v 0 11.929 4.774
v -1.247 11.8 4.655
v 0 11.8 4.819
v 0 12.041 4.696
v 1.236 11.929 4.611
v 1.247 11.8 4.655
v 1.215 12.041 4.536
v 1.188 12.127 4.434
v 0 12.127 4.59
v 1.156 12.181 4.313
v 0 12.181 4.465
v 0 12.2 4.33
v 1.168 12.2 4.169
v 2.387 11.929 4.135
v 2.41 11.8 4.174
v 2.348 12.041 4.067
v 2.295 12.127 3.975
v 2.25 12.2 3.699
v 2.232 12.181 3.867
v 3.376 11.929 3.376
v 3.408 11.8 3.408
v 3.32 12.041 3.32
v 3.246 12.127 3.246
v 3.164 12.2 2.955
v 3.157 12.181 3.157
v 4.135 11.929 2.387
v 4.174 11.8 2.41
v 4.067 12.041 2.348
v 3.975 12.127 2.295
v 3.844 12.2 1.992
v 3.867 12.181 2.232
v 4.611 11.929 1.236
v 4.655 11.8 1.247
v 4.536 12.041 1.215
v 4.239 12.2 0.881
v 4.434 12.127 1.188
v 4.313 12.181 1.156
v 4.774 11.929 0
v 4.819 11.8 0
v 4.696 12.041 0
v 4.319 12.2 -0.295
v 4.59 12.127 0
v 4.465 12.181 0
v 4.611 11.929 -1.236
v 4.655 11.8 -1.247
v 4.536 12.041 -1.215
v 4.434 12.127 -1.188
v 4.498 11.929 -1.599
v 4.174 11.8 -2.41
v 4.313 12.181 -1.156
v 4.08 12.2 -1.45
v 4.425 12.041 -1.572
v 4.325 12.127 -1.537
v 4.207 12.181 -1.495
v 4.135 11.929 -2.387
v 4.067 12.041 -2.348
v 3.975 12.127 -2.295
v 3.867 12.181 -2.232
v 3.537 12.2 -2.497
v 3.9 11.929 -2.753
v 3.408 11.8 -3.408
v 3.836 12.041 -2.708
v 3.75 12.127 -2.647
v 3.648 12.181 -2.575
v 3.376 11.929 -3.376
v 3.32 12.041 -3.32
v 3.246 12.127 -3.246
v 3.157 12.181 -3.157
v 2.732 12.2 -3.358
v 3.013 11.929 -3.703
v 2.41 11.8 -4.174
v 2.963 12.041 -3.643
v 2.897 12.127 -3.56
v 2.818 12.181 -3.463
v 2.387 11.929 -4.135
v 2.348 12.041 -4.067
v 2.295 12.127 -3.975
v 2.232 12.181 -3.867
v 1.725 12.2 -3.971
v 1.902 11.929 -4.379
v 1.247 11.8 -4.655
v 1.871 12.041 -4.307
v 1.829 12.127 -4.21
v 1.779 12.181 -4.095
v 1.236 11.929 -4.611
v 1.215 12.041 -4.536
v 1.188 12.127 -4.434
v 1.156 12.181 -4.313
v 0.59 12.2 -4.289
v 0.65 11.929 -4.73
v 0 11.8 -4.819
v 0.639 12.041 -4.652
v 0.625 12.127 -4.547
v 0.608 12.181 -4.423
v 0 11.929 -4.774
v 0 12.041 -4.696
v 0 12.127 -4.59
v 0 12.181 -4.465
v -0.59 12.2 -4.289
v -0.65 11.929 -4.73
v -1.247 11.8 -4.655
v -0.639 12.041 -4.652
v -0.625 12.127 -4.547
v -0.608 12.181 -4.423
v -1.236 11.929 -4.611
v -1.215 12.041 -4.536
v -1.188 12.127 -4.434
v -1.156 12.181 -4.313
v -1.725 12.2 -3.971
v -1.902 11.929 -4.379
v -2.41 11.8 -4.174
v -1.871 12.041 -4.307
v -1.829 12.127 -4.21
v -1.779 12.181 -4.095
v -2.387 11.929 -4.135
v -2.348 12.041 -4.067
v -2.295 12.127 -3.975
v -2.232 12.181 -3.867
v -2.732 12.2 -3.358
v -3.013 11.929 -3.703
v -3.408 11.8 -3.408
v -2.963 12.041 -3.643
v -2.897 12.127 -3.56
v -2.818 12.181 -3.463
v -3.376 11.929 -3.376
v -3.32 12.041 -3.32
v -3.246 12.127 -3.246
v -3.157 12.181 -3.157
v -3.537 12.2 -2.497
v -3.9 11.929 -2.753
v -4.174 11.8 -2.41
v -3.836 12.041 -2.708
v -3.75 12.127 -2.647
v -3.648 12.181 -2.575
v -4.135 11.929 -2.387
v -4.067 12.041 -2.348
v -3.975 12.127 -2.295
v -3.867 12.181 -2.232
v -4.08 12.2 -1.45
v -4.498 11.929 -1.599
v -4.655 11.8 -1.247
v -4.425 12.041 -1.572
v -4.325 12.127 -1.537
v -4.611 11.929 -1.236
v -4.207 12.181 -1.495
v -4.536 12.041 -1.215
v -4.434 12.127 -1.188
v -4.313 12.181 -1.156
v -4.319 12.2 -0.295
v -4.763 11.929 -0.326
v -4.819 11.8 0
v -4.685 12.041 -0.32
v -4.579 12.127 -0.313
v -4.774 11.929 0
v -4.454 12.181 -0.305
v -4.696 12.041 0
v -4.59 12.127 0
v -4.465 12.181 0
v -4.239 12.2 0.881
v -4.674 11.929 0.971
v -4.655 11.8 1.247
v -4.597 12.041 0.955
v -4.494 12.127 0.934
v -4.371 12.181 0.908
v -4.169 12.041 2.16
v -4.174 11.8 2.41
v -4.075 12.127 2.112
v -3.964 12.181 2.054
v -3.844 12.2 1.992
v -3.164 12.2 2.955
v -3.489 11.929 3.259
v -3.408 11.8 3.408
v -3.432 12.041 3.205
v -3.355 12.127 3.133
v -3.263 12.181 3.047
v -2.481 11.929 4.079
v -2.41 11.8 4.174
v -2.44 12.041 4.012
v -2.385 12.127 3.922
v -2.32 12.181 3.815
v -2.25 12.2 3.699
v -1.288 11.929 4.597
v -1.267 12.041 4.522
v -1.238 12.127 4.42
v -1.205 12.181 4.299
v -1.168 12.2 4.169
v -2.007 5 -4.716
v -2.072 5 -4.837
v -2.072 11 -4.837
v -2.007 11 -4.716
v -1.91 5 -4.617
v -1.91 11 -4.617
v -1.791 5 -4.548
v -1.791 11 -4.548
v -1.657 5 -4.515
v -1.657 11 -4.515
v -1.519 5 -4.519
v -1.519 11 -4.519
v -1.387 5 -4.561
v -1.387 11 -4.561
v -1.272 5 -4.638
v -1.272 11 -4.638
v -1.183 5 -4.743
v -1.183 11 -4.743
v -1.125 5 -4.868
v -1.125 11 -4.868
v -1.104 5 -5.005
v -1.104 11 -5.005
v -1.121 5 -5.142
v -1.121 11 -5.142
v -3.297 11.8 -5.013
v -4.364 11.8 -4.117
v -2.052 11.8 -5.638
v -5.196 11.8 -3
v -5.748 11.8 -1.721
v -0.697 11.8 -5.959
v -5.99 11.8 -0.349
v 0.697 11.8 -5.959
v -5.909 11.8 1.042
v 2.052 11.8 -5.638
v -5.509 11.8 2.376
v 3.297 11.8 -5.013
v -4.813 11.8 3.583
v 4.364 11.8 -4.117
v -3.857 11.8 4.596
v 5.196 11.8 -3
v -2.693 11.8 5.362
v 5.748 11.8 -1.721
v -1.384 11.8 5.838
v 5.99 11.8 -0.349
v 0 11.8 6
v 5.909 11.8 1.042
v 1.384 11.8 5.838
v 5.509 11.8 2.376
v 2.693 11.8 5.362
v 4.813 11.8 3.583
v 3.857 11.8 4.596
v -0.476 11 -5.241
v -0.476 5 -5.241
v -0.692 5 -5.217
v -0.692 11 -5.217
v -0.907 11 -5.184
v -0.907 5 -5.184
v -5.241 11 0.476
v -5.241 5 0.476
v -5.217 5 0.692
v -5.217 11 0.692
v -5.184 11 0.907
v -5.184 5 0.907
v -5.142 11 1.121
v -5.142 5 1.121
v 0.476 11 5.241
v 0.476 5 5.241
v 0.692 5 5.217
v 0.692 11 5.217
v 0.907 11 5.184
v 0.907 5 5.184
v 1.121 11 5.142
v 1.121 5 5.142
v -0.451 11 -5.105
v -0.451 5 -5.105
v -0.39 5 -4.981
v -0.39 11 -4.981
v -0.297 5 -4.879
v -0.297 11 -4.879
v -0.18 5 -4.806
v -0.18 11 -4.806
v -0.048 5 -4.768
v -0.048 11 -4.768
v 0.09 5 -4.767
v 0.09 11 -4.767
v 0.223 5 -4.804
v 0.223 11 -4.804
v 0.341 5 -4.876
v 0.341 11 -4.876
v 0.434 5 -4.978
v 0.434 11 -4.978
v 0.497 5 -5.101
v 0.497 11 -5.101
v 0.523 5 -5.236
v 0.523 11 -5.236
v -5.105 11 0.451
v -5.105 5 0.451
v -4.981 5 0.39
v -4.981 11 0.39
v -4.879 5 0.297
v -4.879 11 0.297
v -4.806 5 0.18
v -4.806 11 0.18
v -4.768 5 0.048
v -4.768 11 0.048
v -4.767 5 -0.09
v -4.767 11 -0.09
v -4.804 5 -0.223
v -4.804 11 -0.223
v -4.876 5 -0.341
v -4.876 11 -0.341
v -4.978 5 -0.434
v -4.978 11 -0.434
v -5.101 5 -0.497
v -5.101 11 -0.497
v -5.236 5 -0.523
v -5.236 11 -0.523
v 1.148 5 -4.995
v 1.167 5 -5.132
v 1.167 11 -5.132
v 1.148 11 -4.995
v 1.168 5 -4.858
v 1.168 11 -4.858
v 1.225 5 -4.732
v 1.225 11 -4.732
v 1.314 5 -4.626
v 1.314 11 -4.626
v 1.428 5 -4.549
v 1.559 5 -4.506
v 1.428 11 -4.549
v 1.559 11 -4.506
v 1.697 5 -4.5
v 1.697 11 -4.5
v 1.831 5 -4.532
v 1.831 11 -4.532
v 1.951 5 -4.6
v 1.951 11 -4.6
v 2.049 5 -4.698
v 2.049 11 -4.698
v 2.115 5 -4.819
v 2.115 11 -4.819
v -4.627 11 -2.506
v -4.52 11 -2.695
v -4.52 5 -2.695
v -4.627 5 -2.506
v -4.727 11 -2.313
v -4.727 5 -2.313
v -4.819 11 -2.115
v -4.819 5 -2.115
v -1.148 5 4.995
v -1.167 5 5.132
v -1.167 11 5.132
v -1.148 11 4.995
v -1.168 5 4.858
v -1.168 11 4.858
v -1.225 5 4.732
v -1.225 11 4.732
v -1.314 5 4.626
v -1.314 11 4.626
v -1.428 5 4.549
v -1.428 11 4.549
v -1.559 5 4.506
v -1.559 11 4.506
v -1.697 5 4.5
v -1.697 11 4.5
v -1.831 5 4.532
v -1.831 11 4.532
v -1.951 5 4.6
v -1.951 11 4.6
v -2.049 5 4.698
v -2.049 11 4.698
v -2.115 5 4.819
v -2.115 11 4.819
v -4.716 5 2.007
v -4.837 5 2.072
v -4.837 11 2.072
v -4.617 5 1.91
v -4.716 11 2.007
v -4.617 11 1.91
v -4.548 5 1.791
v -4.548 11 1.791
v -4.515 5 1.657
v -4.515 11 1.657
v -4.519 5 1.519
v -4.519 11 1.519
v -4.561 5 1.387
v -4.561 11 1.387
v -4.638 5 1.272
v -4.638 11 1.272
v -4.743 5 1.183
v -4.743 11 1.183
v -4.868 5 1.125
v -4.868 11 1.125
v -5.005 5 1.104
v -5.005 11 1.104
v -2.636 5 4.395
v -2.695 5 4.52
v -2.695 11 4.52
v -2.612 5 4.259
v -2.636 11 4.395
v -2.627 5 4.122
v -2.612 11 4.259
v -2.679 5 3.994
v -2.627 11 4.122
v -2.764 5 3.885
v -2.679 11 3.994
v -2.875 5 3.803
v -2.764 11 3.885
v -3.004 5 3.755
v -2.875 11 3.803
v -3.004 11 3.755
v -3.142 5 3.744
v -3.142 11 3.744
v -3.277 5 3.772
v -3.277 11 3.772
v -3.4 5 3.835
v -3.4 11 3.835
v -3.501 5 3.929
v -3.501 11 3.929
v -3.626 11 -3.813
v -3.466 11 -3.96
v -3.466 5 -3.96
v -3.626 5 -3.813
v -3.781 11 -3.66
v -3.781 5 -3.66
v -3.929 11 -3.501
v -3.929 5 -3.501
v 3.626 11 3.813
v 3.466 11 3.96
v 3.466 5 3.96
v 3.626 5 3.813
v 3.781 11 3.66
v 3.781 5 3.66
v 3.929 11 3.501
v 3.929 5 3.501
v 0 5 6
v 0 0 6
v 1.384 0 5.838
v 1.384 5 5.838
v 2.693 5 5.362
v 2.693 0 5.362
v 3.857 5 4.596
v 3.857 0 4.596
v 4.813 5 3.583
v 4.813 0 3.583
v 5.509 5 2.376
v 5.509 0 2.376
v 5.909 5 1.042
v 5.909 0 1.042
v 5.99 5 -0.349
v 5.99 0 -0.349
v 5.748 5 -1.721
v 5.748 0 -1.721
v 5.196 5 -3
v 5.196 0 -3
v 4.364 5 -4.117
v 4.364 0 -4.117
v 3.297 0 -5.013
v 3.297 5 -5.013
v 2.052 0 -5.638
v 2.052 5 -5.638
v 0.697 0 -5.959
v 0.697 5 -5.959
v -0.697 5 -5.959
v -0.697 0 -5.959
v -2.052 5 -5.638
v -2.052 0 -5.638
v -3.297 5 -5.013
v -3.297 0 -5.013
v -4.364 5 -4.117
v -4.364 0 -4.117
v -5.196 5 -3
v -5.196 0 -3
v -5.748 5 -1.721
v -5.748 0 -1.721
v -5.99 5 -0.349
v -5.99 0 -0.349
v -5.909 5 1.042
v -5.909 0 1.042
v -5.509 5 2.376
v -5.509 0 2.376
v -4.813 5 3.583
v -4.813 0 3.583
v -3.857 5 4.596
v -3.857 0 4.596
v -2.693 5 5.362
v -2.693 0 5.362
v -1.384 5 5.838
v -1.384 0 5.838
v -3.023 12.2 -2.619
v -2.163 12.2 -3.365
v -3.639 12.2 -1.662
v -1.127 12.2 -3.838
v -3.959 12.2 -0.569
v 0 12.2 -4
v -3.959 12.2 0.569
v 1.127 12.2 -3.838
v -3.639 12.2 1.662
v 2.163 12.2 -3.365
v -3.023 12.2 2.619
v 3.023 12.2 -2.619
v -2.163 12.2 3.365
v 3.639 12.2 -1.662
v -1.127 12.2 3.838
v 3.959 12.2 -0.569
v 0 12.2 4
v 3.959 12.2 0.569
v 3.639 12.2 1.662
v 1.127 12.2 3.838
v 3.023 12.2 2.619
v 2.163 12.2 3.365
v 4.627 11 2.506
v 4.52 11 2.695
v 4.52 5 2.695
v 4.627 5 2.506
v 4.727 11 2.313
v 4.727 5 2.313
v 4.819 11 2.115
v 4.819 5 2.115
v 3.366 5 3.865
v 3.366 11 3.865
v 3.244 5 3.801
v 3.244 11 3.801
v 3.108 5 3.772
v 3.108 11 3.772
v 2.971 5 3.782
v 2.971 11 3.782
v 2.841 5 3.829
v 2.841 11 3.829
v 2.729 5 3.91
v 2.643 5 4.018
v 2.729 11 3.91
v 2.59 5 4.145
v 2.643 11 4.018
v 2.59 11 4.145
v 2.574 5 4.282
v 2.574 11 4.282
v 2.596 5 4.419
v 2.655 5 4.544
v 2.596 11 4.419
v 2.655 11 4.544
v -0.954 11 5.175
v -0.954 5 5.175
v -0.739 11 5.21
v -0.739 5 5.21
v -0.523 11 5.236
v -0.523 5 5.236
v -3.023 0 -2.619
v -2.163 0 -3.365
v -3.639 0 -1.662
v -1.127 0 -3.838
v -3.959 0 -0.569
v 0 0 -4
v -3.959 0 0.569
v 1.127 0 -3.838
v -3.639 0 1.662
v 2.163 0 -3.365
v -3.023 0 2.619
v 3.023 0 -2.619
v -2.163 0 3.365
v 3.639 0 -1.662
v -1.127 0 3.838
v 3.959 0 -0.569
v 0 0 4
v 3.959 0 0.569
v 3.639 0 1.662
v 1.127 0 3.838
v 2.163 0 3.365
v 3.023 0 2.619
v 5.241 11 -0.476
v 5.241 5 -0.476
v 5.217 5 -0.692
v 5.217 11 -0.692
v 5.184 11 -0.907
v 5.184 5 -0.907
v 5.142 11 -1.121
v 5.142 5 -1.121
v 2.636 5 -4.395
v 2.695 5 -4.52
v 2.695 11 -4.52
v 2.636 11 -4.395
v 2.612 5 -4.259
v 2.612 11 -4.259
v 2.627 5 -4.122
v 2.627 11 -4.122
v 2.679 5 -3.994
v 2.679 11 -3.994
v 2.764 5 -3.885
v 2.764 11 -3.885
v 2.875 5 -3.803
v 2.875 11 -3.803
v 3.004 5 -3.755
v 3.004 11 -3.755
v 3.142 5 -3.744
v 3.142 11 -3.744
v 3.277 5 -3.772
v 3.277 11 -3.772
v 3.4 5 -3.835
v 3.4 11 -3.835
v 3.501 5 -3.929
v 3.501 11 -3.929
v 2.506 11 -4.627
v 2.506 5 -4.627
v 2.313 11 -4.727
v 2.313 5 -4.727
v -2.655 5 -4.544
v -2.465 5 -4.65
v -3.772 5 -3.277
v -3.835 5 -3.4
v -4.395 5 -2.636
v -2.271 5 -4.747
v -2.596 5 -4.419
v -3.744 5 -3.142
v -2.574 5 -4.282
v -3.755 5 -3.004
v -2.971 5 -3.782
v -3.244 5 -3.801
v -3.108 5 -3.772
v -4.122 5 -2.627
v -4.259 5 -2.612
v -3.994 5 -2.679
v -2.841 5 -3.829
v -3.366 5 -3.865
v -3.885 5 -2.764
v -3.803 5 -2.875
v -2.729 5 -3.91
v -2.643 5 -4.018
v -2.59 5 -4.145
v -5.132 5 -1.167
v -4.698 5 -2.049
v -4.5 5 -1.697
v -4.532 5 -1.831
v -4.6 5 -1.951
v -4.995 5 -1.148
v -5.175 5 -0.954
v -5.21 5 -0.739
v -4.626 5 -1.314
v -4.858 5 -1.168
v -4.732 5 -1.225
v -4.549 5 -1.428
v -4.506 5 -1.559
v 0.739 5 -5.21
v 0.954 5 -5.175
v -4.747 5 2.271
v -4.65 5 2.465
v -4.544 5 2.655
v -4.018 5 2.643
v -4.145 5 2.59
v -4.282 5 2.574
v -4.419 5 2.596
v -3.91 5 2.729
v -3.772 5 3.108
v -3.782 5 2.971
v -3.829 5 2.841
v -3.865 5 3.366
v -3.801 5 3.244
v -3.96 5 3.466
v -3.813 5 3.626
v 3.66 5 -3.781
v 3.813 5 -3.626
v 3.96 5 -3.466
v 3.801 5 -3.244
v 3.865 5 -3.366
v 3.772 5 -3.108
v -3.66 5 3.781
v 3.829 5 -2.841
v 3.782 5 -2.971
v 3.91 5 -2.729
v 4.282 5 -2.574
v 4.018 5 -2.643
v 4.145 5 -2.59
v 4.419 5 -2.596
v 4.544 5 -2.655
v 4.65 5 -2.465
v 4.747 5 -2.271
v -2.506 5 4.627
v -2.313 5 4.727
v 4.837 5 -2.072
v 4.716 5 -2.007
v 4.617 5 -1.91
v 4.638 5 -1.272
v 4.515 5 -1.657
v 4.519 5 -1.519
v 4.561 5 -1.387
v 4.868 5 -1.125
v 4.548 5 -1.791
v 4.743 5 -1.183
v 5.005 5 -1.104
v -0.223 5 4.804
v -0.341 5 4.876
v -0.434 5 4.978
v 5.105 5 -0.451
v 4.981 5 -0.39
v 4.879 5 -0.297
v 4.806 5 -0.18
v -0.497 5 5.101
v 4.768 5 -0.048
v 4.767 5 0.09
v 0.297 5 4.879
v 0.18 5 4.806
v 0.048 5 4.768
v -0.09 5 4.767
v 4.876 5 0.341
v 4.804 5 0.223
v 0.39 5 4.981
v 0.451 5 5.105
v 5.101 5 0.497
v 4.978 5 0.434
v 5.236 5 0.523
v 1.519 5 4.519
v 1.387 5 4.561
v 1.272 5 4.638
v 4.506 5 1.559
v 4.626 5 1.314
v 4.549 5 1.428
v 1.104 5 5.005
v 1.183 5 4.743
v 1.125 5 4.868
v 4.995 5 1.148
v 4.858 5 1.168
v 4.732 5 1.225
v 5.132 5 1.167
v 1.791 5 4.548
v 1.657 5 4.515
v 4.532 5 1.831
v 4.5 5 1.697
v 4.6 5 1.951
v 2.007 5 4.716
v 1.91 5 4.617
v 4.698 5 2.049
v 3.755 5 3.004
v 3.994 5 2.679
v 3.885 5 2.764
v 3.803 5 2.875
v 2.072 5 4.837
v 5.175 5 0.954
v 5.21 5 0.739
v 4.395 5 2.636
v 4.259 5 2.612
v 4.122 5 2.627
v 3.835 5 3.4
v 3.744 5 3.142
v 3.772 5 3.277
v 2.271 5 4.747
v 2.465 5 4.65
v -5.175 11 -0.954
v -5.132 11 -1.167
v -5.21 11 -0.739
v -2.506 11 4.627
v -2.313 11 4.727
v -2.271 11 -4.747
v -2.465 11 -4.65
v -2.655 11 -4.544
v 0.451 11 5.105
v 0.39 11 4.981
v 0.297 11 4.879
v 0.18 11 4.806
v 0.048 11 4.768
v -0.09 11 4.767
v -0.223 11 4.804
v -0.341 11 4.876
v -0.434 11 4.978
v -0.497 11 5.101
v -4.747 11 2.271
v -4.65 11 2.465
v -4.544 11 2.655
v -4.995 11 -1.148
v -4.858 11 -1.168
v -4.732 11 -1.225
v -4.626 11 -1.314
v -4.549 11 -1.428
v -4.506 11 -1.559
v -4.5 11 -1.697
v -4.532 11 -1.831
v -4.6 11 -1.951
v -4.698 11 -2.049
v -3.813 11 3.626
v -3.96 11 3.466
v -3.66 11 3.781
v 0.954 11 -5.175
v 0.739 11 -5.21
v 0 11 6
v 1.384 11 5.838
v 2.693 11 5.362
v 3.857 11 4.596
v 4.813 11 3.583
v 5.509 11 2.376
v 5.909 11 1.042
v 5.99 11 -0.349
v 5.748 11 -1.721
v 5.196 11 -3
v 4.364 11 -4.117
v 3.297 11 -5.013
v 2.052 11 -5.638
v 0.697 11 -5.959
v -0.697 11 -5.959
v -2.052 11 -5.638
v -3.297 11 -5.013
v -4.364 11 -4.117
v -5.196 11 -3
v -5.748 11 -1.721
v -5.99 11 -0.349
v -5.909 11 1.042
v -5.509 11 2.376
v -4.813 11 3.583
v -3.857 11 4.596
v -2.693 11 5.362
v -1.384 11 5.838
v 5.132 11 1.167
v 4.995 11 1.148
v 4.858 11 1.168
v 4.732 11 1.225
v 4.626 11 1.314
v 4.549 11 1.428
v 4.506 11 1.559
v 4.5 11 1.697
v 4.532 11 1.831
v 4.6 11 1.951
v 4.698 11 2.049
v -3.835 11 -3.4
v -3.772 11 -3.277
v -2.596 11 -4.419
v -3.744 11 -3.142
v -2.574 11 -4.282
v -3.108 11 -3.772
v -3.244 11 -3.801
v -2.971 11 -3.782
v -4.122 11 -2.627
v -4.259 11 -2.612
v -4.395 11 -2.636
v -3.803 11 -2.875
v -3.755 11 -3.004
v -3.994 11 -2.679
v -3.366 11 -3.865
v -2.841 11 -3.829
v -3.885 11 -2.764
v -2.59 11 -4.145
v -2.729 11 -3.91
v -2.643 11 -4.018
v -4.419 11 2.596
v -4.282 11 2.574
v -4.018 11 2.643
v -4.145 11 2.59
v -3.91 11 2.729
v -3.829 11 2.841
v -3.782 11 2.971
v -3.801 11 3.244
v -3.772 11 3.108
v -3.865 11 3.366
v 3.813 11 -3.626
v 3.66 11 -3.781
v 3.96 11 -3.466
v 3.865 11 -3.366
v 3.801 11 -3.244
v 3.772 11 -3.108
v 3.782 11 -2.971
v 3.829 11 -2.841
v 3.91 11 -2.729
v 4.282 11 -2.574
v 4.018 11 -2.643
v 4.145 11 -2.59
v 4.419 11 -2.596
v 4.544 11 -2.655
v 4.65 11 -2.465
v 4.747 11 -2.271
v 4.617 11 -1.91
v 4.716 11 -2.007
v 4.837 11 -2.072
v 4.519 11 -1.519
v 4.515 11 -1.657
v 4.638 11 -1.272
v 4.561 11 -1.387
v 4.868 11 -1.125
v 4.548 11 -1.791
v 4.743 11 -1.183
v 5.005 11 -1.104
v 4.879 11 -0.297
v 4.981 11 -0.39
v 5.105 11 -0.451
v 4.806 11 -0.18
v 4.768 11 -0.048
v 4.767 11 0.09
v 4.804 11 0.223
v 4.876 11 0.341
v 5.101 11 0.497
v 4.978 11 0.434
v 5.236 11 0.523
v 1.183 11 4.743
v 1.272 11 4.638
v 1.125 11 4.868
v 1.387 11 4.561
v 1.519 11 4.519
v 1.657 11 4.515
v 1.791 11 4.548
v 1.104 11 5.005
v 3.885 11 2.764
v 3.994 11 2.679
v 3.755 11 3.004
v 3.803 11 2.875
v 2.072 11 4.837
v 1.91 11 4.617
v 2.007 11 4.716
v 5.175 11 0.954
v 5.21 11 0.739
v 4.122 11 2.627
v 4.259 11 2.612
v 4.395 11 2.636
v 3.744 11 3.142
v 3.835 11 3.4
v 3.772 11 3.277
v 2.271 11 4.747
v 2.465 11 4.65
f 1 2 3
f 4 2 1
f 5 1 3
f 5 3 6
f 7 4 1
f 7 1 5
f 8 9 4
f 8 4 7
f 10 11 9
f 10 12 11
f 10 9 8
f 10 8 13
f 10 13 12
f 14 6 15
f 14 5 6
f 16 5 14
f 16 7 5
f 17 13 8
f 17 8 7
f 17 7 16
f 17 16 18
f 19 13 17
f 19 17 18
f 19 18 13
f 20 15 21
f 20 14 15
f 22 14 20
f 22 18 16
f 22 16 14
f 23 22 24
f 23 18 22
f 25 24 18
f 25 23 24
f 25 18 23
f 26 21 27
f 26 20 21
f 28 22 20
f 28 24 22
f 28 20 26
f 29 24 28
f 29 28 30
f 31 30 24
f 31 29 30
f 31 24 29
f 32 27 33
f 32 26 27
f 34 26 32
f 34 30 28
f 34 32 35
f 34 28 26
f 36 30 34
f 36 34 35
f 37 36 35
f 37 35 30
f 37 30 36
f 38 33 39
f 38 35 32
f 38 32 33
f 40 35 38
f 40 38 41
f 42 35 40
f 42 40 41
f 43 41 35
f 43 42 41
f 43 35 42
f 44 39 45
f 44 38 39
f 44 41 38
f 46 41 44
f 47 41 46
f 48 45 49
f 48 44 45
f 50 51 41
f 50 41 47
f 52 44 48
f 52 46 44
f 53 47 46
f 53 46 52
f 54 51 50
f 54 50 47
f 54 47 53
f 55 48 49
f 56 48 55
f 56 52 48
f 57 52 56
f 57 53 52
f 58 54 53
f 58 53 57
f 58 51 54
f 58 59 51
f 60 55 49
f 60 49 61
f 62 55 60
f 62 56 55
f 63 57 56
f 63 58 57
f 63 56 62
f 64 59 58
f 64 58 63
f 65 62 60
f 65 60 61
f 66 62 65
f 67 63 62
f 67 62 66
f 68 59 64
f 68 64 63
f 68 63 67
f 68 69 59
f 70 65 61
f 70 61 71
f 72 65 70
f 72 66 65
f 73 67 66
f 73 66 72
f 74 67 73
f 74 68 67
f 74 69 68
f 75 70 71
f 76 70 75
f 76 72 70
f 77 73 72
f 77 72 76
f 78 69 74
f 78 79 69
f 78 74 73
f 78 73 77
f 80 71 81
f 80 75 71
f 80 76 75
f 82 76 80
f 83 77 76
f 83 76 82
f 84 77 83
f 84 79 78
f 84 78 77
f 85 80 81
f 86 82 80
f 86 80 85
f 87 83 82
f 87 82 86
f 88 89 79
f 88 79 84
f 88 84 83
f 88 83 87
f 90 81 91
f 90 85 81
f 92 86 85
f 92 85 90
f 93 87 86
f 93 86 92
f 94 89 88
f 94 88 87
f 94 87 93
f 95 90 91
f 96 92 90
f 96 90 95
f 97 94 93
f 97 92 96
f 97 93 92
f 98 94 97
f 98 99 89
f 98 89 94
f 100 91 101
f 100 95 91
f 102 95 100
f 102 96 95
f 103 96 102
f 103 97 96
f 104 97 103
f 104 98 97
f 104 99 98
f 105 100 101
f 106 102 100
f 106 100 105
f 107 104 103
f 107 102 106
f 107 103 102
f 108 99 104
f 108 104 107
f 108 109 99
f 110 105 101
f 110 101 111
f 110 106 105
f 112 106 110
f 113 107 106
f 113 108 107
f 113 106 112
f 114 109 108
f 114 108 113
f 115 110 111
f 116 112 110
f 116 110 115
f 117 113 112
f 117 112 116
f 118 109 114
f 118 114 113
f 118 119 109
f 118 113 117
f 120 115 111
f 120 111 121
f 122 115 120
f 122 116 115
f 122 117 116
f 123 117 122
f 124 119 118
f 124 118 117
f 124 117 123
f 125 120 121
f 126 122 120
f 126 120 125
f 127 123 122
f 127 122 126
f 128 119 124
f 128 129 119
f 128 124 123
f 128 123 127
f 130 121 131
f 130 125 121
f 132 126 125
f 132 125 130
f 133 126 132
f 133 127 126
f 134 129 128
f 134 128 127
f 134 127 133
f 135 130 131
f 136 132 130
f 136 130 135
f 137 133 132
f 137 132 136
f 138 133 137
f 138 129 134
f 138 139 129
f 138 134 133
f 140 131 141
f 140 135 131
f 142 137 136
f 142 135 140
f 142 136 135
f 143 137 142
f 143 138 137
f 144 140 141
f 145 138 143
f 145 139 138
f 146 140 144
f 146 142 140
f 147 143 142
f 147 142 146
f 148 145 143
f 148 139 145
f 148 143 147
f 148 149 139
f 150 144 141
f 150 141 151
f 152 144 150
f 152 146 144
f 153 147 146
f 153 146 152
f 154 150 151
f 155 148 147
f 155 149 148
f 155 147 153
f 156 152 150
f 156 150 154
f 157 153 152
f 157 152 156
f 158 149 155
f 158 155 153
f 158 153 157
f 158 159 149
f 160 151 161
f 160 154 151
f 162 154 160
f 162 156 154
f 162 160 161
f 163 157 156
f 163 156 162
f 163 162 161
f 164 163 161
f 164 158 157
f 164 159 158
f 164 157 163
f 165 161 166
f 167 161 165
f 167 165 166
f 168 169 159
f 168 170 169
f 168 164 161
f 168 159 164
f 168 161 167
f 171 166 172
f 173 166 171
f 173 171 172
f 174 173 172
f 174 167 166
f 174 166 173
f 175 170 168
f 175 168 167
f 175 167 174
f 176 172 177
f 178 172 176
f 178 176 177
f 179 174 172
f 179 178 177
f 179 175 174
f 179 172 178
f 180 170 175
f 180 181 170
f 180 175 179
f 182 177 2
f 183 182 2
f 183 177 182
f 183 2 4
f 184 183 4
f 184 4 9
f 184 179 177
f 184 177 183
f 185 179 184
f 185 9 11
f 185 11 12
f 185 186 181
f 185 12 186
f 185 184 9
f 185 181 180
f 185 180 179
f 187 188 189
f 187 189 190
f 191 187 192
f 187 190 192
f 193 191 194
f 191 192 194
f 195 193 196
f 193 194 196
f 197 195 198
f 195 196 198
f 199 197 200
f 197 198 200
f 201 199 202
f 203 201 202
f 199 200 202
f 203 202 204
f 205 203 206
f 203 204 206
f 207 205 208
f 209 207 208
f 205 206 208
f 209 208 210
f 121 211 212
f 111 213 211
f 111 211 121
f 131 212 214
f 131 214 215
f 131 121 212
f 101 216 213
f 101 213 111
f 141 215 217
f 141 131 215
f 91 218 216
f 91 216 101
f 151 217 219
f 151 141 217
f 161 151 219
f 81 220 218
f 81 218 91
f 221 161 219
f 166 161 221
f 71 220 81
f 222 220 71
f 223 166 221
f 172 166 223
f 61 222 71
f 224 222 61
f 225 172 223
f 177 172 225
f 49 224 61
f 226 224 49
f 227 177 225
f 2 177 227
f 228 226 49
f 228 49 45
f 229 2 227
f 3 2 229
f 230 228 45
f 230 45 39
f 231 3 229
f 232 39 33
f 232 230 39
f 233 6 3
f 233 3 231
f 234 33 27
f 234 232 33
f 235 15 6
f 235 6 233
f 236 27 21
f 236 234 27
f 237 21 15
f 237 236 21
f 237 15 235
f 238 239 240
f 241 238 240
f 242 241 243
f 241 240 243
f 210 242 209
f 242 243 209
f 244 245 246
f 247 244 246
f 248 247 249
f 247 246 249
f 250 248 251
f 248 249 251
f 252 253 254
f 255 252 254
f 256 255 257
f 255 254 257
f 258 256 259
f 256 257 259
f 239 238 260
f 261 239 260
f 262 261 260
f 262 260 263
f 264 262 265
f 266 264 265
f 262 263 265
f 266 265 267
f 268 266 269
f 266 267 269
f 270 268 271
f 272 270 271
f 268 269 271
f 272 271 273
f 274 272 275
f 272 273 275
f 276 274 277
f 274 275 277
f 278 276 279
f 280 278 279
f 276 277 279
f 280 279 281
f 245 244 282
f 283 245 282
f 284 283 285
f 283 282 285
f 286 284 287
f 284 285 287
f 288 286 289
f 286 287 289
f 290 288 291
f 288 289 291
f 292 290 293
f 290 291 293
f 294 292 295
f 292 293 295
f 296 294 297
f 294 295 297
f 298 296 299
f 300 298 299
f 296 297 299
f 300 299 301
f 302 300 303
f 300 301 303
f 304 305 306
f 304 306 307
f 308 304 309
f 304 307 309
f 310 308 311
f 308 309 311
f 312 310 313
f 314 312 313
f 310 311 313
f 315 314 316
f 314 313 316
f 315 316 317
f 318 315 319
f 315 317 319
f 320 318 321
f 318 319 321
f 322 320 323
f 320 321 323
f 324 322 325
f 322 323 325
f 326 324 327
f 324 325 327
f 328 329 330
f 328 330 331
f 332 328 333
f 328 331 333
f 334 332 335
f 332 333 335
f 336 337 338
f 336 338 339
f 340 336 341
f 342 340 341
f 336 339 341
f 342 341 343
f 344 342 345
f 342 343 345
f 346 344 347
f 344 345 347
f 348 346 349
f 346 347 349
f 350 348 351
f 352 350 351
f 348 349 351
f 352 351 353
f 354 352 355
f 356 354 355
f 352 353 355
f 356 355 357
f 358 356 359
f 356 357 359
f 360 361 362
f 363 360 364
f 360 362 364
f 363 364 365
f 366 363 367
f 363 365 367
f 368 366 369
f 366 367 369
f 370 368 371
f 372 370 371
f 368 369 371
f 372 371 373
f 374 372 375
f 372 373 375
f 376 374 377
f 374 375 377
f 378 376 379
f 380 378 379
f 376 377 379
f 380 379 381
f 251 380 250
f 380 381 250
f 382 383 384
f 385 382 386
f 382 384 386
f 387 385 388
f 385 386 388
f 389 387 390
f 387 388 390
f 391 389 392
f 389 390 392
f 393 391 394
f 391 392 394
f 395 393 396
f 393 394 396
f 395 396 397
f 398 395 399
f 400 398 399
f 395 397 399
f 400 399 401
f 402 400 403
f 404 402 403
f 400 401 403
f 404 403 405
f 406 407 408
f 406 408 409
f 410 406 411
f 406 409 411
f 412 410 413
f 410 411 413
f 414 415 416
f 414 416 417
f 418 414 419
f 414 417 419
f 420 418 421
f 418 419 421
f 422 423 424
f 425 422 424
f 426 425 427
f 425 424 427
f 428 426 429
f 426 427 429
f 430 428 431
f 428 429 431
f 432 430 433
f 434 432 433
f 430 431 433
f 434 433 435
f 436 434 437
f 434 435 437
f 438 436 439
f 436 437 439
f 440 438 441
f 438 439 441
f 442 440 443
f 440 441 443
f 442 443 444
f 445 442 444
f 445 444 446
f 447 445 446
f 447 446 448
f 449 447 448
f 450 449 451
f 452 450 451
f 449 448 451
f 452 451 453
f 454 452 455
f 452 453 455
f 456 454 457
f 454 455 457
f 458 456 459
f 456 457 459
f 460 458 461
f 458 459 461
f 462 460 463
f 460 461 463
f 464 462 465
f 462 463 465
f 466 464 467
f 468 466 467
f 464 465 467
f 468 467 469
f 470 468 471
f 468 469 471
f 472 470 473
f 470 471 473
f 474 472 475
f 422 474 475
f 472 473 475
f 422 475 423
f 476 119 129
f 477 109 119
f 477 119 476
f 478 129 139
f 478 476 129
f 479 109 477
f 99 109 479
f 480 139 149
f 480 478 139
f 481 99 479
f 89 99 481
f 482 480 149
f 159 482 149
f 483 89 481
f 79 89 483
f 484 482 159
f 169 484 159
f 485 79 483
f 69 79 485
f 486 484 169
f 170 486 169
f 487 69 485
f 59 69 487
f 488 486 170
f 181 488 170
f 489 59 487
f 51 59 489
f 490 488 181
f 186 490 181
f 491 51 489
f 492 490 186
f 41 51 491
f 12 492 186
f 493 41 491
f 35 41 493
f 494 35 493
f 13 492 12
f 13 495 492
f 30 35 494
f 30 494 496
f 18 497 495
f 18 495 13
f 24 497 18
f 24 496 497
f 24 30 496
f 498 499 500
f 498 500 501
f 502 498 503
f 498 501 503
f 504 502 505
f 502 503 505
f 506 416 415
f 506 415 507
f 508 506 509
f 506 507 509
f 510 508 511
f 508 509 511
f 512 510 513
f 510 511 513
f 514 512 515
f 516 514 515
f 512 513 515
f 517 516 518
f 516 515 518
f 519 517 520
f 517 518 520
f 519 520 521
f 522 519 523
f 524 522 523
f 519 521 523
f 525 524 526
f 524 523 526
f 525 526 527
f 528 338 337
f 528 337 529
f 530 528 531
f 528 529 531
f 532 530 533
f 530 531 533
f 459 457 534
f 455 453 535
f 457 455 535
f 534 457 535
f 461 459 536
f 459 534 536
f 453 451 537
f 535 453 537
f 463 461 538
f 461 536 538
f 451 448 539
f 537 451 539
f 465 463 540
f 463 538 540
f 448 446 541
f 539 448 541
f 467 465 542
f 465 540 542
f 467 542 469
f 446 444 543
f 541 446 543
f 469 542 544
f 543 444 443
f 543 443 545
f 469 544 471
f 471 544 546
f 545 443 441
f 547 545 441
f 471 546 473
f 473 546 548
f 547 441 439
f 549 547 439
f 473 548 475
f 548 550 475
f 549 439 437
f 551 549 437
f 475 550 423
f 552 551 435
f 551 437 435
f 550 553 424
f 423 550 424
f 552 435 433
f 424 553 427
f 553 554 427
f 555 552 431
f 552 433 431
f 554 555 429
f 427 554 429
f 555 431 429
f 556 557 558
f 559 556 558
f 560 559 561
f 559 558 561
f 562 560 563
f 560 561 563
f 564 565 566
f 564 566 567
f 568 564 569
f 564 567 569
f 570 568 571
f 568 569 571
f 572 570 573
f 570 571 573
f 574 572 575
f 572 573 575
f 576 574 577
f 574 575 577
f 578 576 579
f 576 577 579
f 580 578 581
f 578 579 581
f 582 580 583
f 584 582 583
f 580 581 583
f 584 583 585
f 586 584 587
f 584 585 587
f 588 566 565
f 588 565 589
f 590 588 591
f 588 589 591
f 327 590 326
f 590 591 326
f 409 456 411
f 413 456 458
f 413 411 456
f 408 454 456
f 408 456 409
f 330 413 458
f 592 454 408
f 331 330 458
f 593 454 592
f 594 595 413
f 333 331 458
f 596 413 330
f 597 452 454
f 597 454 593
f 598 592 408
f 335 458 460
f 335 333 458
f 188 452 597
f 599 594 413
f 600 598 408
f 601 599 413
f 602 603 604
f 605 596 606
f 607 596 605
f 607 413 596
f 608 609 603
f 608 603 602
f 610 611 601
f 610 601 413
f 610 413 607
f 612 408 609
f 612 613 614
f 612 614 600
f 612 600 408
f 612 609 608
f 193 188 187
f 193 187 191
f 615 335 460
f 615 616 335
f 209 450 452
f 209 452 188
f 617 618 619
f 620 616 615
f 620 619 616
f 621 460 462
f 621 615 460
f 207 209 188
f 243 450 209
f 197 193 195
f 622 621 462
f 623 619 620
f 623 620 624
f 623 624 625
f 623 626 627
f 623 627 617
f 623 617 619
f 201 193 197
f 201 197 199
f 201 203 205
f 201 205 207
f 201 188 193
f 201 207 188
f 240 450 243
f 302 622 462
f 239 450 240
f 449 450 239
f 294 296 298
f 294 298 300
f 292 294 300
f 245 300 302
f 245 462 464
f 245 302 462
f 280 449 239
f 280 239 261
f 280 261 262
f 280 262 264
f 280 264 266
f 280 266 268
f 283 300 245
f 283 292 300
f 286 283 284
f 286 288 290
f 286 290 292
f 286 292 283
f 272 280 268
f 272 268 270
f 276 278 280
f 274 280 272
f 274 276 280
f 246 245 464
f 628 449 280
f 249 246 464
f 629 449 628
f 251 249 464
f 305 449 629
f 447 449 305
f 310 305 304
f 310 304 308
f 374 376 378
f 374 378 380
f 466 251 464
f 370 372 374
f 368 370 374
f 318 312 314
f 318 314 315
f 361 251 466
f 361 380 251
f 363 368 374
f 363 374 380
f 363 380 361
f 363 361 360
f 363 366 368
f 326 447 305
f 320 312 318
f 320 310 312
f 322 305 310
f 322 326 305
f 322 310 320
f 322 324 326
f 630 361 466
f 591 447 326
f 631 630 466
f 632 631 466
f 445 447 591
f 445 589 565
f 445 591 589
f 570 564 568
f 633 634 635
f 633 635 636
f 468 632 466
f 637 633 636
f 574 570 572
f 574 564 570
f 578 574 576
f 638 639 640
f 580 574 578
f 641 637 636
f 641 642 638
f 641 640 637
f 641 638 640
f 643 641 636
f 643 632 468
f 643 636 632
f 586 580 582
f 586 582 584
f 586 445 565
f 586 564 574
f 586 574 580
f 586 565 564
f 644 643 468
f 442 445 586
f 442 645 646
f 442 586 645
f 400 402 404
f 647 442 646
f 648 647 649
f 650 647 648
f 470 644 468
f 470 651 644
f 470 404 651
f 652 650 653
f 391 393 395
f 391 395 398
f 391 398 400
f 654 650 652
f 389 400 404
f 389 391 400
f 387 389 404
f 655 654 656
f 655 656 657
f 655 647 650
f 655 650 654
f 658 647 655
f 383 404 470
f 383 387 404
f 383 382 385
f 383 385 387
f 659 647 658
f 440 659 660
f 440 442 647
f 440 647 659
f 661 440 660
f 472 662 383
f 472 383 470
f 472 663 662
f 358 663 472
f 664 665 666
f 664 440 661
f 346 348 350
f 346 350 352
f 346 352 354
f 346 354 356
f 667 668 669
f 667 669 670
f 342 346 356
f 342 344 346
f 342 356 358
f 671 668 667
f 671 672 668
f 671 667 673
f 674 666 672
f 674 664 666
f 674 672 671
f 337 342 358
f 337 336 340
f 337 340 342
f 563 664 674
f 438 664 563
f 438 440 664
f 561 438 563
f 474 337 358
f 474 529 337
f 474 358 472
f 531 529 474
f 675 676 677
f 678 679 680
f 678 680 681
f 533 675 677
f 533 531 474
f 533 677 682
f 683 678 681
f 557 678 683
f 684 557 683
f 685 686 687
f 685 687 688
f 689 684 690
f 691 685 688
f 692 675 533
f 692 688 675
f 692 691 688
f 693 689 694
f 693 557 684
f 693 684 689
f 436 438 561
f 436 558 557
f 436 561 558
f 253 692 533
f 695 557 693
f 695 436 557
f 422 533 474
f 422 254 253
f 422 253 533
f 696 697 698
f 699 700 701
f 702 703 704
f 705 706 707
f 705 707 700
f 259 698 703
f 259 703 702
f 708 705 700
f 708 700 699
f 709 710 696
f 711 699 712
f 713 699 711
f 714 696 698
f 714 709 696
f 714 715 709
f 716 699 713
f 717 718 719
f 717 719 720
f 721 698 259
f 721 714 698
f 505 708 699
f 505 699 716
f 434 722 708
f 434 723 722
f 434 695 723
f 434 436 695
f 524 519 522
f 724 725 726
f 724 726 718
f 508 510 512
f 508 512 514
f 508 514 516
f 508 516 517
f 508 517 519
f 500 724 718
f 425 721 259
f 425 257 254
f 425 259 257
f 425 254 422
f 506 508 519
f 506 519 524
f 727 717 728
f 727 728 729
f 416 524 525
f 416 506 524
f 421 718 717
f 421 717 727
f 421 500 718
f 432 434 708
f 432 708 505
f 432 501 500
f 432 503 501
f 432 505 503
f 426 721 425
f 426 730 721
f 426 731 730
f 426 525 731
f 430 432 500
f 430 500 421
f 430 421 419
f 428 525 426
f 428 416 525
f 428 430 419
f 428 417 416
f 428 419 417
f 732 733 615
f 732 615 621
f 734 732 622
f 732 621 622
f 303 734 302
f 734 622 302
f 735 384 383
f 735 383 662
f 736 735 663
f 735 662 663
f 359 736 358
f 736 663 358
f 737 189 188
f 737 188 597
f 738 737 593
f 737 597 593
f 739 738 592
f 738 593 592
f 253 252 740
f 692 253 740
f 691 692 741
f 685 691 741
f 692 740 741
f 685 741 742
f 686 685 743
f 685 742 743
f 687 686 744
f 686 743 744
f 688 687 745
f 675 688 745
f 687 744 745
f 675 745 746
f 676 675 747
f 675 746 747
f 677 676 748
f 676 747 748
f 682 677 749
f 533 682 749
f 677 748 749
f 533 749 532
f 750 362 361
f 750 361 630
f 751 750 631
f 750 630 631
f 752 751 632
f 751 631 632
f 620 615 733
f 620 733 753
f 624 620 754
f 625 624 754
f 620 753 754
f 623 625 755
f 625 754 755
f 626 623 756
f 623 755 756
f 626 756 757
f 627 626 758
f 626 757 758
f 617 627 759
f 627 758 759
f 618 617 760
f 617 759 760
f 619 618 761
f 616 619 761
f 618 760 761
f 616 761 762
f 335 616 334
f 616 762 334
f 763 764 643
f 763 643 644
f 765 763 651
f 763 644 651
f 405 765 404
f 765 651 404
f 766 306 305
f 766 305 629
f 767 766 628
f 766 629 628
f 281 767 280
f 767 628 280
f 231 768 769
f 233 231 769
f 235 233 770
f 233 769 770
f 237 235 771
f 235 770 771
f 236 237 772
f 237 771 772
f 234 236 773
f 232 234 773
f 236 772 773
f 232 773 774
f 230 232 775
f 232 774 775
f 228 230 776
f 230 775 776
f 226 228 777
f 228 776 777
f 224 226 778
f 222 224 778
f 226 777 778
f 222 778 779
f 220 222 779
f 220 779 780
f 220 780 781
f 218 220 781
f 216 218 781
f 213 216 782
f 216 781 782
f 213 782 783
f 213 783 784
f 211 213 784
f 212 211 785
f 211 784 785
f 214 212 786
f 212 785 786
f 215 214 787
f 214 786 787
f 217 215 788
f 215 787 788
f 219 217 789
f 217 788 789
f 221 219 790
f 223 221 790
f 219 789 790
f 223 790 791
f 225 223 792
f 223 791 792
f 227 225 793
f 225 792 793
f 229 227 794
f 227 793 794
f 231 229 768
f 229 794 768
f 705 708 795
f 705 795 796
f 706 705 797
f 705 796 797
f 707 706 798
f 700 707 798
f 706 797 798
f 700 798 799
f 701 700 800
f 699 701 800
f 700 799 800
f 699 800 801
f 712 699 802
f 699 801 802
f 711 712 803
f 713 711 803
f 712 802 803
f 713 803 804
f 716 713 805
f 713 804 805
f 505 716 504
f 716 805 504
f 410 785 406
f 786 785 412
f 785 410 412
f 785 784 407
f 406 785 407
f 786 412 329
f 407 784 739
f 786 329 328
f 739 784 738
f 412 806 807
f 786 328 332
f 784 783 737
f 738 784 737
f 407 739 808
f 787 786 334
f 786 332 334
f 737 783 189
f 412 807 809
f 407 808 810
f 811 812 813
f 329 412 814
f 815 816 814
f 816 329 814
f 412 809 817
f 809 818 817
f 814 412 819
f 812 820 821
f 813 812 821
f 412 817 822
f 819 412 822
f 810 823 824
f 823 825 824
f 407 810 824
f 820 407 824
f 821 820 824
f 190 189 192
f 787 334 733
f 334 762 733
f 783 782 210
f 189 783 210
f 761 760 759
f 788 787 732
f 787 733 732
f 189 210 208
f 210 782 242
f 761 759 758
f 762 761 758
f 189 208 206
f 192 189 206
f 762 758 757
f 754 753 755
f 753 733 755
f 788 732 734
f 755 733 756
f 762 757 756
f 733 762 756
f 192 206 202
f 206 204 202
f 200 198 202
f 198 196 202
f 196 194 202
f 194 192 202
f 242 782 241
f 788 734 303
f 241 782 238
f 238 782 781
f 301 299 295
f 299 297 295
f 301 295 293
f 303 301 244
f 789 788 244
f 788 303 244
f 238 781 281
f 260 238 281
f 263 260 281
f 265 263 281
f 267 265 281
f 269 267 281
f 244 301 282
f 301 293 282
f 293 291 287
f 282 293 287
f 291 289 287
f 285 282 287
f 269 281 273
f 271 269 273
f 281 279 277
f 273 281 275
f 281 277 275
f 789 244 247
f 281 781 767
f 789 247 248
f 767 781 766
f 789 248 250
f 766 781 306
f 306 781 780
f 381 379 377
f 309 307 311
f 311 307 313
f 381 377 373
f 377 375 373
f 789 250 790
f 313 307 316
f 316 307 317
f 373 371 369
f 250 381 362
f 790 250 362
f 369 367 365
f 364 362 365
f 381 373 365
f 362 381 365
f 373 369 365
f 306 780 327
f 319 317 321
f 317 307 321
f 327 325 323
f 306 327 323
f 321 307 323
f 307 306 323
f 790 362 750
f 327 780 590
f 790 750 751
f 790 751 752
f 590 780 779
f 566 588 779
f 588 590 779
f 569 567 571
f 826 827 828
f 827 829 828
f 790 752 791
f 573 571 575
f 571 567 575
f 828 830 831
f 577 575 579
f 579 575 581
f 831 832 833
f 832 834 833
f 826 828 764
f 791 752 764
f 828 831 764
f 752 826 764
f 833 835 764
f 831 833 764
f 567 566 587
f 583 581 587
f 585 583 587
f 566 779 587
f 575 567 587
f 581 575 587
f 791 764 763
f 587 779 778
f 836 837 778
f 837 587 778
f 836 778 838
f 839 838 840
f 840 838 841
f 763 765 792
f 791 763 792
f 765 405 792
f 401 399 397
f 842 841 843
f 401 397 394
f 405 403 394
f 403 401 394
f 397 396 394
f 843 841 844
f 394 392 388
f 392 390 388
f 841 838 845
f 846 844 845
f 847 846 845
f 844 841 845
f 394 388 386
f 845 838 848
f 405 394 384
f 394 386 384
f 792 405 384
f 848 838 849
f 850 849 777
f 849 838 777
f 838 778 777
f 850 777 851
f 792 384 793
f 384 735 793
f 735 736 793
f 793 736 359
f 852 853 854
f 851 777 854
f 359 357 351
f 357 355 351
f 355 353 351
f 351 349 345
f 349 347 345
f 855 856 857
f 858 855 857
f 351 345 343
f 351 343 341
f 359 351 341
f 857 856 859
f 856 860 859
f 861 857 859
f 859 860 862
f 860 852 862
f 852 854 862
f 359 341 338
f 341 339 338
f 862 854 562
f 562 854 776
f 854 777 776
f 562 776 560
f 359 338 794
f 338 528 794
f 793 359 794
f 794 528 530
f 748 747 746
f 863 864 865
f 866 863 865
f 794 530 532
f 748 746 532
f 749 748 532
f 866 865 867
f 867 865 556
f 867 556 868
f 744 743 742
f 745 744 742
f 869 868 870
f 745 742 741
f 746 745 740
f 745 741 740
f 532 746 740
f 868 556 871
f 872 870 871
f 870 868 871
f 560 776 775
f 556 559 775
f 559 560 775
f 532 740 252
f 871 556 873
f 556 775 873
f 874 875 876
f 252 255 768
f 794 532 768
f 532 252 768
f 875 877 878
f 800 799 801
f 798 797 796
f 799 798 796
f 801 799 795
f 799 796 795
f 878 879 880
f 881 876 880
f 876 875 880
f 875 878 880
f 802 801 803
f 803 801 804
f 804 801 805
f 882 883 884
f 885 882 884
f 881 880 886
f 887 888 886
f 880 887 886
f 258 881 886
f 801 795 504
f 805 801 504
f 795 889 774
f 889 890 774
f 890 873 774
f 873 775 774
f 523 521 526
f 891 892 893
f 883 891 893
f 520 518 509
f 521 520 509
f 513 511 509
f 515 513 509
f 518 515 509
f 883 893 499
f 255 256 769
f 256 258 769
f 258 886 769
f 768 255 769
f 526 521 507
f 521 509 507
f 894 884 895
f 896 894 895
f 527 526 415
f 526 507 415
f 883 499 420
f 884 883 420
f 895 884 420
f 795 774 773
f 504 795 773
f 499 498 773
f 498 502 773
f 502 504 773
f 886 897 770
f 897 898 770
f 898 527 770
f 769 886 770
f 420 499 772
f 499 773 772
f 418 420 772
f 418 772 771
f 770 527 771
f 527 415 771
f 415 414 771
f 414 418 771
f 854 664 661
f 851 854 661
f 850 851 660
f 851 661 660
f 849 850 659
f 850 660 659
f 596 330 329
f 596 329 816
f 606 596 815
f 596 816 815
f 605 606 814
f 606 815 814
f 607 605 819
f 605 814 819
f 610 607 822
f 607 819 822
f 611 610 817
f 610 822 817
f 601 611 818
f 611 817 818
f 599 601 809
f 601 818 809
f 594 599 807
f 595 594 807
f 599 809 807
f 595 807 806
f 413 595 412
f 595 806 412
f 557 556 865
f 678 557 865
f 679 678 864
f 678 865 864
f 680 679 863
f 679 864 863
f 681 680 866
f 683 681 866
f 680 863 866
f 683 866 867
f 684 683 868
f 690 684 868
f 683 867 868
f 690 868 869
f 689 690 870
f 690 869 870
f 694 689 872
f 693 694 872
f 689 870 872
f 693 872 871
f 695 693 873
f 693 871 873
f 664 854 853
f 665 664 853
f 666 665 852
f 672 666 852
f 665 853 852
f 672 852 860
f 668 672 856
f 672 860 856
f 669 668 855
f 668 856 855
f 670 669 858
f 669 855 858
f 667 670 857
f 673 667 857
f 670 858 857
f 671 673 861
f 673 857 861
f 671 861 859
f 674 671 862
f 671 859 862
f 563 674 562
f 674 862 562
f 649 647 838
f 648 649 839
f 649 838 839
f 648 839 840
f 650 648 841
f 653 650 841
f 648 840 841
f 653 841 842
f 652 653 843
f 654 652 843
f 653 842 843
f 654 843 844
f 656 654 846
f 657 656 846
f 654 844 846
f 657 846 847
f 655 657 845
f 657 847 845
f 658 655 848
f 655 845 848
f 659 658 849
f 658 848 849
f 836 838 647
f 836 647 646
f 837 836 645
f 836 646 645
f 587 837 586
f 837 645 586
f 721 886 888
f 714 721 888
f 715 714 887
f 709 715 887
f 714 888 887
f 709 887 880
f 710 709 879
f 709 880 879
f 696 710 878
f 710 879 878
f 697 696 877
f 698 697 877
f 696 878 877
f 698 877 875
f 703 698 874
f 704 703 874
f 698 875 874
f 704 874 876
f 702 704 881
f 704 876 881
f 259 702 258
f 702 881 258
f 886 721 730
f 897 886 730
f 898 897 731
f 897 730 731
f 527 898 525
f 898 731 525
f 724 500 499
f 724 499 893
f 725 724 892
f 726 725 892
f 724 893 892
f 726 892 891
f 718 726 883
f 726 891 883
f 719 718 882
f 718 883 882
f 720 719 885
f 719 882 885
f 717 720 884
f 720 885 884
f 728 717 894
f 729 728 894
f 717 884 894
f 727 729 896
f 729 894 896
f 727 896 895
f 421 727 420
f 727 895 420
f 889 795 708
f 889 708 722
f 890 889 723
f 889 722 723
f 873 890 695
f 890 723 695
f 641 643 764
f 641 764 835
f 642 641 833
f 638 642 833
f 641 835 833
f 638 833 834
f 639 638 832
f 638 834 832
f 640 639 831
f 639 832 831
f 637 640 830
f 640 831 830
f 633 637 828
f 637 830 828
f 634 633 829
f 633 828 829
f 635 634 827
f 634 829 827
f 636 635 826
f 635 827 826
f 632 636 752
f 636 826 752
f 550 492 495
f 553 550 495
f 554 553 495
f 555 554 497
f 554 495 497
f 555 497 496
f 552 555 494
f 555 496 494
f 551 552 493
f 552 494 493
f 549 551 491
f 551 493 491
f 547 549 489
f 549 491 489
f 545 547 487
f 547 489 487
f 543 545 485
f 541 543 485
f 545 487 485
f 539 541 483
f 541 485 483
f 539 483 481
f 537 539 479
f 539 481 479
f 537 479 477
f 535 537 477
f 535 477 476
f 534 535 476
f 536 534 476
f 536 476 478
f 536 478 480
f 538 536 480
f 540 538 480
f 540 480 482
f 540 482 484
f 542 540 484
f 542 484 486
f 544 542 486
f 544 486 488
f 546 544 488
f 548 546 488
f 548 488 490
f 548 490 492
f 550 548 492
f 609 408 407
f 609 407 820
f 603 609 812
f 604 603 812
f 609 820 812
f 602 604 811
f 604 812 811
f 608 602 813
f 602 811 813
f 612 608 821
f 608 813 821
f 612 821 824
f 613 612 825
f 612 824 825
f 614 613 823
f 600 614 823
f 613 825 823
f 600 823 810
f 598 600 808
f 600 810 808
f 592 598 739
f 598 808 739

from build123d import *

# Parameters (mm, degrees)
SKETCH1_R           = 6
BOSS_EXTRUDE1_DEPTH = 5
SKETCH2_R           = 5.262480872
BOSS_EXTRUDE2_DEPTH = 6
SKETCH3_R           = 0.5
CUT_EXTRUDE1_DEPTH  = 6
SKETCH4_R           = 6
BOSS_EXTRUDE3_DEPTH = 0.8
SKETCH5_R           = 4.819461856
BOSS_EXTRUDE4_DEPTH = 0.4
FILLET3_R           = 0.5
SKETCH6_R           = 4
CUT_EXTRUDE2_DEPTH  = 15.860686391


with BuildPart() as part:
    # Sketch1 → Boss-Extrude1 (new body)
    with BuildSketch(Plane(origin=(0, 0, 0), x_dir=(1, 0, 0), z_dir=(0, 1, 0))):
        with Locations(Location((0, 0, 0), (0, 0, 270))):
            Circle(SKETCH1_R)
    extrude(amount=BOSS_EXTRUDE1_DEPTH)

    # Sketch2 → Boss-Extrude2 (add)
    with BuildSketch(Plane(origin=(0, 5, 0), x_dir=(1, 0, 0), z_dir=(0, 1, 0))):
        with Locations(Location((0, 0, 0), (0, 0, 270))):
            Circle(SKETCH2_R)
    extrude(amount=BOSS_EXTRUDE2_DEPTH)

    # Sketch3 → Cut-Extrude1 (cut)
    with BuildSketch(Plane(origin=(0, 11, 0), x_dir=(1, 0, 0), z_dir=(0, 1, 0))):
        with Locations((-1.603876434, 5.012113856)):
            Circle(SKETCH3_R)
        with Locations((0.023451225, 5.262428619)):
            Circle(SKETCH3_R)
        with Locations((1.648483316, 4.997620202)):
            Circle(SKETCH3_R)
        with Locations((3.112150373, 4.2436099)):
            Circle(SKETCH3_R)
        with Locations((4.271178469, 3.074205493)):
            Circle(SKETCH3_R)
        with Locations((5.012113856, 1.603876434)):
            Circle(SKETCH3_R)
        with Locations((5.262428619, -0.023451225)):
            Circle(SKETCH3_R)
        with Locations((4.997620202, -1.648483316)):
            Circle(SKETCH3_R)
        with Locations((4.2436099, -3.112150373)):
            Circle(SKETCH3_R)
        with Locations((3.074205493, -4.271178469)):
            Circle(SKETCH3_R)
        with Locations((1.603876434, -5.012113856)):
            Circle(SKETCH3_R)
        with Locations((-0.023451225, -5.262428619)):
            Circle(SKETCH3_R)
        with Locations((-1.648483316, -4.997620202)):
            Circle(SKETCH3_R)
        with Locations((-3.112150373, -4.2436099)):
            Circle(SKETCH3_R)
        with Locations((-4.271178469, -3.074205493)):
            Circle(SKETCH3_R)
        with Locations((-5.012113856, -1.603876434)):
            Circle(SKETCH3_R)
        with Locations((-5.262428619, 0.023451225)):
            Circle(SKETCH3_R)
        with Locations((-4.997620202, 1.648483316)):
            Circle(SKETCH3_R)
        with Locations((-4.2436099, 3.112150373)):
            Circle(SKETCH3_R)
        with Locations((-3.074205493, 4.271178469)):
            Circle(SKETCH3_R)
    extrude(amount=-CUT_EXTRUDE1_DEPTH, mode=Mode.SUBTRACT)

    # Sketch4 → Boss-Extrude3 (add)
    with BuildSketch(Plane(origin=(0, 11, 0), x_dir=(1, 0, 0), z_dir=(0, 1, 0))):
        with Locations(Location((0, 0, 0), (0, 0, 270))):
            Circle(SKETCH4_R)
    extrude(amount=BOSS_EXTRUDE3_DEPTH)

    # Sketch5 → Boss-Extrude4 (add)
    with BuildSketch(Plane(origin=(0, 11.8, 0), x_dir=(1, 0, 0), z_dir=(0, 1, 0))):
        with Locations(Location((0, 0, 0), (0, 0, 270))):
            Circle(SKETCH5_R)
    extrude(amount=BOSS_EXTRUDE4_DEPTH)

    # Fillet3
    # the kernel refuses this fillet: 0.5 mm, written as the material it takes off along each edge
    with BuildSketch(Plane(origin=(0, 12.2, 0), x_dir=(0, 0, 1), z_dir=(-1, 0, 0))) as fillet3_piece_1:
        with BuildLine():
            CenterArc((4.329563907, -0.5), FILLET3_R, 11.536959033, 78.463040967)
            Line((4.329563907, 0), (4.329563907, 0.01))
            Line((4.329563907, 0.01), (4.819461856, 0.01))
            Line((4.819461856, 0.01), (4.829461856, 0))
            ThreePointArc((4.829461856, 0), (4.829461856, -0.2), (4.829259815, -0.398))
            Line((4.829259815, -0.398), (4.819461856, -0.4))
        make_face()
    revolve(axis=Axis((0, 12.2, 0), (0, 1, 0)), mode=Mode.SUBTRACT)

    # Sketch6 → Cut-Extrude2 (cut, through all)
    with BuildSketch(Plane(origin=(0, 12.2, 0), x_dir=(1, 0, 0), z_dir=(0, 1, 0))):
        with Locations(Location((0, 0, 0), (0, 0, 270))):
            Circle(SKETCH6_R)
    extrude(amount=-CUT_EXTRUDE2_DEPTH, mode=Mode.SUBTRACT)


solid = part.part
